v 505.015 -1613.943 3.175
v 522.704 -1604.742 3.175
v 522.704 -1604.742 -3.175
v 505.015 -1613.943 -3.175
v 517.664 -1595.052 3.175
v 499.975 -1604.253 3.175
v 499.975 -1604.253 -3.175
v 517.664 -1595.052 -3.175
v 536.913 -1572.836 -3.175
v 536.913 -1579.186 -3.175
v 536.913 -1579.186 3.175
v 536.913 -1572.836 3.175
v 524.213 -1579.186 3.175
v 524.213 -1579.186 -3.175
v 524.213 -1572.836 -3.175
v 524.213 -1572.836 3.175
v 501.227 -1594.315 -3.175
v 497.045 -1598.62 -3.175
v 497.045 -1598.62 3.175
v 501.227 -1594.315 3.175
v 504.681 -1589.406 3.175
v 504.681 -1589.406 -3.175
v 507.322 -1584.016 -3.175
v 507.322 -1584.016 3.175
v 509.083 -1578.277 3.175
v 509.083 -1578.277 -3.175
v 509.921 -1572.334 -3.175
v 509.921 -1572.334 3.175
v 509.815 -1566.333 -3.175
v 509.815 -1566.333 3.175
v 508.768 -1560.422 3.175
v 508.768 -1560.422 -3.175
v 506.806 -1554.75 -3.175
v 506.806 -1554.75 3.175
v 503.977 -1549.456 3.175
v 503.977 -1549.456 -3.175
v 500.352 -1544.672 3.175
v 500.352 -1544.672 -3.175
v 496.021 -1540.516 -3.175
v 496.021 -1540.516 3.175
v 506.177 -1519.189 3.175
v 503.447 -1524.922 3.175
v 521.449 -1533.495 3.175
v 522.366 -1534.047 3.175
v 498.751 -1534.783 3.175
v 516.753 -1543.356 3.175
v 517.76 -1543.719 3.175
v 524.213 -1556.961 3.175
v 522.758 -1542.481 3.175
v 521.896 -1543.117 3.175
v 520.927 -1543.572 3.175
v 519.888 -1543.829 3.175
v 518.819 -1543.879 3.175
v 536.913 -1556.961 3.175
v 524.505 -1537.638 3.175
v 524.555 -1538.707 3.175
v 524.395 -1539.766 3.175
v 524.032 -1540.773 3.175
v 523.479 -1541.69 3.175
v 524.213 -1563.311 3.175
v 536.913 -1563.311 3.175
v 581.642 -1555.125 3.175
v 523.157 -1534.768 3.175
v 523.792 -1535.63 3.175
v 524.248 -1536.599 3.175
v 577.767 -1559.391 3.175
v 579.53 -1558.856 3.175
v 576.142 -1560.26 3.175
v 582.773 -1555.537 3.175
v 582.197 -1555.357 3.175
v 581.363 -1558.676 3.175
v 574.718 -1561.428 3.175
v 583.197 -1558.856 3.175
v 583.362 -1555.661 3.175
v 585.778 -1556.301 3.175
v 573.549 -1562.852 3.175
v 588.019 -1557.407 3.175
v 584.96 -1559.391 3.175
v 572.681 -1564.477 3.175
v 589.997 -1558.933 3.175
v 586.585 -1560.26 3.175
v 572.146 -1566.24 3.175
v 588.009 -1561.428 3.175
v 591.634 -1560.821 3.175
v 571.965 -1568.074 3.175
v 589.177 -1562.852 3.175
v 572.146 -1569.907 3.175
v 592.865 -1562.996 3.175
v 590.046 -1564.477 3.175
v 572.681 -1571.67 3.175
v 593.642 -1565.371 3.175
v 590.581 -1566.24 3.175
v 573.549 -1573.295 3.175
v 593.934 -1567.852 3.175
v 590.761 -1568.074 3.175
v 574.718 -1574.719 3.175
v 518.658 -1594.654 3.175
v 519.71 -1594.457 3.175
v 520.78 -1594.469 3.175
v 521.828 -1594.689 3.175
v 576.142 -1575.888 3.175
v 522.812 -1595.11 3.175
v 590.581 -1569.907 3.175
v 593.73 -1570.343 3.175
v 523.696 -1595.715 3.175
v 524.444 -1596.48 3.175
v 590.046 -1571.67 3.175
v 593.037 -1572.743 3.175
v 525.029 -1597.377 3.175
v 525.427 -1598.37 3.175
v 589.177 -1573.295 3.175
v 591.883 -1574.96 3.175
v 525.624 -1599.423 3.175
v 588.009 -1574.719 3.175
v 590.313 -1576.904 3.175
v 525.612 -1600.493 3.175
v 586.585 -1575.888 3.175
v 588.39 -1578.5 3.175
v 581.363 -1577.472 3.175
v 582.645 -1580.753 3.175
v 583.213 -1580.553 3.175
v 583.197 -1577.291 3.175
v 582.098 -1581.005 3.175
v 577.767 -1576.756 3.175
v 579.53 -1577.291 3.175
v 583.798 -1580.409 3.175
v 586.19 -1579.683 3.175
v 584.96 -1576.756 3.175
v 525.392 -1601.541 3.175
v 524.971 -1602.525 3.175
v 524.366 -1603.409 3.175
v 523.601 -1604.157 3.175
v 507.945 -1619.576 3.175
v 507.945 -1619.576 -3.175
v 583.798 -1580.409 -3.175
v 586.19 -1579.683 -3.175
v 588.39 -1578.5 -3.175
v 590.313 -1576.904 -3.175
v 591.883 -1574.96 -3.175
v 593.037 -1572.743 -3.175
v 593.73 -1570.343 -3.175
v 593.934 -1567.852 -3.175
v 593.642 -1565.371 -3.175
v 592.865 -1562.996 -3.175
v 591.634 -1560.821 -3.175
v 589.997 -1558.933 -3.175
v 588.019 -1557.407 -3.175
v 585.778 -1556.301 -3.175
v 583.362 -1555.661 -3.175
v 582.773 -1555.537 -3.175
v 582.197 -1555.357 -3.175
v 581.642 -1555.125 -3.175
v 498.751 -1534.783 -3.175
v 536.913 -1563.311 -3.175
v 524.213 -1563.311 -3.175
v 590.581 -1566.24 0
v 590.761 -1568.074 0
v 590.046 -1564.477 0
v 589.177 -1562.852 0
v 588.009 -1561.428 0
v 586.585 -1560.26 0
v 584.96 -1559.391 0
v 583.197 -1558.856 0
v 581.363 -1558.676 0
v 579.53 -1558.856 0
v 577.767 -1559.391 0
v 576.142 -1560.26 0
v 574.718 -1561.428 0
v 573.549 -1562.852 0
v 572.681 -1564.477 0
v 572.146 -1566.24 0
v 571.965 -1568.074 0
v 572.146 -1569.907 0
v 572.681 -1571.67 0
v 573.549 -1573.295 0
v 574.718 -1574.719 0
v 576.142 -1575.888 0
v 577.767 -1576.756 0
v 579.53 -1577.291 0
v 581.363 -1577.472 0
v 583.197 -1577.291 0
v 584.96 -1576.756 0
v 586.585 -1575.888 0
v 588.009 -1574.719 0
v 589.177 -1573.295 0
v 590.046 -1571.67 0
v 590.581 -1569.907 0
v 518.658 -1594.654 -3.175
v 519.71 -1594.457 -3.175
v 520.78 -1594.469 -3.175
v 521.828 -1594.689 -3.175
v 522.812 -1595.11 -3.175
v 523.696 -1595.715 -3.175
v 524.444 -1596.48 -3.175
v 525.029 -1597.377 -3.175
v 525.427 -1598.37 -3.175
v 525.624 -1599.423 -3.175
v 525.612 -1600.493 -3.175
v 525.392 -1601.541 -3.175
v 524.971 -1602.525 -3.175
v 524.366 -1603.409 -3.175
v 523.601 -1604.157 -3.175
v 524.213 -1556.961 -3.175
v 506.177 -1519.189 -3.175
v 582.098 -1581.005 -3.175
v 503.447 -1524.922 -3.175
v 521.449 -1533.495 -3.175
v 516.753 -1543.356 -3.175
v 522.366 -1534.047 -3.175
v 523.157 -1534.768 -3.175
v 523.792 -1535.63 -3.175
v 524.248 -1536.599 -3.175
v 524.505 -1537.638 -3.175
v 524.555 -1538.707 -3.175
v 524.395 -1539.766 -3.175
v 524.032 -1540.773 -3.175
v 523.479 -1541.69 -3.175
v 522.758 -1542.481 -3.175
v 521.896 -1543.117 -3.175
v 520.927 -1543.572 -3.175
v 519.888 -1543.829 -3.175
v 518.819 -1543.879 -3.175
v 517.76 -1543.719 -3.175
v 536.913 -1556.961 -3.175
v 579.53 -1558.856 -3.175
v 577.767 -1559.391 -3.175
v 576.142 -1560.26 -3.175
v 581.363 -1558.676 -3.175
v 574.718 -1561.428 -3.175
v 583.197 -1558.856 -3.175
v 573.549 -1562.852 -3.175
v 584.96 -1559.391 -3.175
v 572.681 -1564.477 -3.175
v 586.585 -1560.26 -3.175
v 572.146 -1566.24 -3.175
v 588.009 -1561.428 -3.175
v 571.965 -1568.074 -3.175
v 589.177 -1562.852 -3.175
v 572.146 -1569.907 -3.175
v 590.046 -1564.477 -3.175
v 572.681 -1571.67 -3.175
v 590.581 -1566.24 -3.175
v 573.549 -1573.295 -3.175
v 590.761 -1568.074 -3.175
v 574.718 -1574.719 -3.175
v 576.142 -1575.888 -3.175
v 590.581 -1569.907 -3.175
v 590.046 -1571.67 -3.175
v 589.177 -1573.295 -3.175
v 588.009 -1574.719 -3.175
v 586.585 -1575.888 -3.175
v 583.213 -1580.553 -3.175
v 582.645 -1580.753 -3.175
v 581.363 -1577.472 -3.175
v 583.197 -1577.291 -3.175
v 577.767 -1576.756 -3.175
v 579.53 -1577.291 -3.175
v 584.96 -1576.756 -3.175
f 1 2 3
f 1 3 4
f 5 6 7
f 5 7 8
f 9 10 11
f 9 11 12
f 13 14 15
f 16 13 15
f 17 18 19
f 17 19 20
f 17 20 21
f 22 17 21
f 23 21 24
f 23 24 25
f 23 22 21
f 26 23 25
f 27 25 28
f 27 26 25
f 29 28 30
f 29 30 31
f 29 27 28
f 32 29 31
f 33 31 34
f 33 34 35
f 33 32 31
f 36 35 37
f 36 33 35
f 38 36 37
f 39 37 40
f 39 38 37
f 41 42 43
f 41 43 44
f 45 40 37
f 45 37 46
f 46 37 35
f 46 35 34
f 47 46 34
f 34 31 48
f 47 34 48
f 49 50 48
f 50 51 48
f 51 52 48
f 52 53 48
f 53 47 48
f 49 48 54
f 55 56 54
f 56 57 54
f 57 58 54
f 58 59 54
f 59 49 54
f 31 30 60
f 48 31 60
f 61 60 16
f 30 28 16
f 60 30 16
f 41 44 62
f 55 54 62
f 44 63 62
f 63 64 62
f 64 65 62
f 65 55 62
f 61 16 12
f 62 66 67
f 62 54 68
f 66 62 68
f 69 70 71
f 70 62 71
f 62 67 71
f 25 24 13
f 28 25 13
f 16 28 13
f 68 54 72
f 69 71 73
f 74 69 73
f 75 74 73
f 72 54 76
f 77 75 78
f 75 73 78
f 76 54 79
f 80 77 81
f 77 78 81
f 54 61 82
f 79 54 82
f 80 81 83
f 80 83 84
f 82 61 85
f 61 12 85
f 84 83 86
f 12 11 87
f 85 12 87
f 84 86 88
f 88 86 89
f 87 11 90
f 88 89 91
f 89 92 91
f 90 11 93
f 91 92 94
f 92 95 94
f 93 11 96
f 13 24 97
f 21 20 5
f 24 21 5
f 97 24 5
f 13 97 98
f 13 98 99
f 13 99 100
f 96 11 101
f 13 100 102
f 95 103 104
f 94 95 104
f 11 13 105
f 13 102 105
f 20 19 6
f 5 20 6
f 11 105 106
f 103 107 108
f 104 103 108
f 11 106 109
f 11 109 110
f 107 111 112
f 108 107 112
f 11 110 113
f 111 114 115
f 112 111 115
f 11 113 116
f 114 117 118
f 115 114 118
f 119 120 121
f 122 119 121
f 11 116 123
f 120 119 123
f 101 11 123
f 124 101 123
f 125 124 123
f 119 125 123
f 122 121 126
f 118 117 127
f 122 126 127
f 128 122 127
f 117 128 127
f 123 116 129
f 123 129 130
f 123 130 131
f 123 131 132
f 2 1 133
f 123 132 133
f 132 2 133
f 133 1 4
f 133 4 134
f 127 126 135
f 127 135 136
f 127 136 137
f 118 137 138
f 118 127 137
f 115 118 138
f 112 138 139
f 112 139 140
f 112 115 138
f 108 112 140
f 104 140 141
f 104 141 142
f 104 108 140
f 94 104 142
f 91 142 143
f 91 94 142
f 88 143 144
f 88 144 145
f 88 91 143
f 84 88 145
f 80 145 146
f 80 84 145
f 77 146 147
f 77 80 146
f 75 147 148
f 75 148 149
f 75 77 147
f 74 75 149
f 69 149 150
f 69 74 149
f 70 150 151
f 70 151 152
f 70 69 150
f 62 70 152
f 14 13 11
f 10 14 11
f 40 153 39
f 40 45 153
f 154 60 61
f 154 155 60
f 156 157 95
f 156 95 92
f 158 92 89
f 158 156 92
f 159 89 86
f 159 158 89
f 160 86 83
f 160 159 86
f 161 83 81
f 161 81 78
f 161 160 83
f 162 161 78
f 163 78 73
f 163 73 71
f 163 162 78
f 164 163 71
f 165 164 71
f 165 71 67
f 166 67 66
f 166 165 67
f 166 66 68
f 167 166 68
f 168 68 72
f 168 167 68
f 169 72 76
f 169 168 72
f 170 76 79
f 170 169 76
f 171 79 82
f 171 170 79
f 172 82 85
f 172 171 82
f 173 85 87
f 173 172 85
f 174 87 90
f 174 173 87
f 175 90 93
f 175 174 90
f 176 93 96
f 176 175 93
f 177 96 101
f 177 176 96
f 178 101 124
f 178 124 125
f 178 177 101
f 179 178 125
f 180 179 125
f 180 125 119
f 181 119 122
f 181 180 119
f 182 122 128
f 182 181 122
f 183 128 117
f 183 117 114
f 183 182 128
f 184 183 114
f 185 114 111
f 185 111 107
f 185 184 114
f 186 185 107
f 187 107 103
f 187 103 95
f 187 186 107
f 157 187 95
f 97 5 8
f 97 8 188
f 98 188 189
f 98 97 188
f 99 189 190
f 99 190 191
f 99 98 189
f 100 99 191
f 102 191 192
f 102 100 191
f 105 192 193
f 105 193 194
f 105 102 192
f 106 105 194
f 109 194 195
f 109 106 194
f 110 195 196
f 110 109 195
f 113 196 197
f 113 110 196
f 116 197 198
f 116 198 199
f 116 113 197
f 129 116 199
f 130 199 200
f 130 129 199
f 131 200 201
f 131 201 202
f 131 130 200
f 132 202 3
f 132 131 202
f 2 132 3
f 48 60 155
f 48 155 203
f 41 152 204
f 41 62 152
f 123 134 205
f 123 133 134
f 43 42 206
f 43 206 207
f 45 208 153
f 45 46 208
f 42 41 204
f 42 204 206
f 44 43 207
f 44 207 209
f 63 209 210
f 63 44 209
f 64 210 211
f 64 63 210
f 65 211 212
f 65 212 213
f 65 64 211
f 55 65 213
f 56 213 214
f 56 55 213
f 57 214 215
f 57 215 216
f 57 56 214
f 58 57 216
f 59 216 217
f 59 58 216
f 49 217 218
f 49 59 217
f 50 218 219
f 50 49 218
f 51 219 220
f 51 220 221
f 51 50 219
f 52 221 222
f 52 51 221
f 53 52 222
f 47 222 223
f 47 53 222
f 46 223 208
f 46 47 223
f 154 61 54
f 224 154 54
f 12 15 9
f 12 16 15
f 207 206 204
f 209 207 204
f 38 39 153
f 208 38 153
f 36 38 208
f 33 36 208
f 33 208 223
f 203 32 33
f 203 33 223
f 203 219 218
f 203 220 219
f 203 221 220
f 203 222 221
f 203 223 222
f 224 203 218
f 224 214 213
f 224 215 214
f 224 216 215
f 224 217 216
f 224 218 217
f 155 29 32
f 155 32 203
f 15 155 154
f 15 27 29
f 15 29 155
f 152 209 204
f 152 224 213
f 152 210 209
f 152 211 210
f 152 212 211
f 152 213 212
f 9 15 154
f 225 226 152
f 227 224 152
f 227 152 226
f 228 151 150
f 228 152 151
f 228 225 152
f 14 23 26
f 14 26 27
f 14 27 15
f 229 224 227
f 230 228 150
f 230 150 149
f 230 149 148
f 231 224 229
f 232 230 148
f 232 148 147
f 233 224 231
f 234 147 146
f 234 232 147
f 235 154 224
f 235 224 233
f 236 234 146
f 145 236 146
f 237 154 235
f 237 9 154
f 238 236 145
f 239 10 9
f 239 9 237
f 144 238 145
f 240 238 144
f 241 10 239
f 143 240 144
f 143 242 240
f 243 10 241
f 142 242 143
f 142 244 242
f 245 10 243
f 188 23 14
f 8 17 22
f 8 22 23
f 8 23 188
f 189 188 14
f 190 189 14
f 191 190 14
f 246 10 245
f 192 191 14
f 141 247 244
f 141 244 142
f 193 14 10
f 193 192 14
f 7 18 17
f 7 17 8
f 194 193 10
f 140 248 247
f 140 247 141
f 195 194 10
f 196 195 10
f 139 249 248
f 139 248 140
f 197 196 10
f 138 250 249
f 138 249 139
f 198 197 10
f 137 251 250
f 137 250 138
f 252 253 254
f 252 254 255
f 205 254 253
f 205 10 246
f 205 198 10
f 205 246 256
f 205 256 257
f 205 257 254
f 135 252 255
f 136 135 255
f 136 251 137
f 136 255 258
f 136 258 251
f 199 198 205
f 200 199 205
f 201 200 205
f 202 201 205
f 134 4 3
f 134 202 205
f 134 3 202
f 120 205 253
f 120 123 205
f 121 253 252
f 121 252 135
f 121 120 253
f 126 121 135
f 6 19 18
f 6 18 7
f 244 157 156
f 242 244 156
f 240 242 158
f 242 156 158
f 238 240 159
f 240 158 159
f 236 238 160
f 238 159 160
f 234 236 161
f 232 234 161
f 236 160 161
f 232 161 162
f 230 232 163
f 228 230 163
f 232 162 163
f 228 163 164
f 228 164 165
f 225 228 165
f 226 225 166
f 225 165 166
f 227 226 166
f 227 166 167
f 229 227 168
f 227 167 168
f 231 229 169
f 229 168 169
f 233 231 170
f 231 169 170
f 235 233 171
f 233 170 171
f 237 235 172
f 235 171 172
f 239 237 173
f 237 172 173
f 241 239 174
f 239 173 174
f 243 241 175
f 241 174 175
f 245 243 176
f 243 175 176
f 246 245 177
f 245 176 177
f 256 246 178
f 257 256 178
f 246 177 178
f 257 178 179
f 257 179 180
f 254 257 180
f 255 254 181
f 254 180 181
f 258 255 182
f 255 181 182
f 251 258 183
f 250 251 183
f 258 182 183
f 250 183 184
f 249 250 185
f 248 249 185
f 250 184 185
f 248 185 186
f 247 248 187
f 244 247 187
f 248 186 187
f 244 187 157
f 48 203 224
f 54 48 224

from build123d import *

# Parameters (mm, degrees)
SKETCH1_R           = 12.573
SKETCH1_R_2         = 9.398
BOSS_EXTRUDE1_DEPTH = 3.175
FILLET1_R           = 38.1
FILLET2_R           = 6.35
SKETCH2_W           = 12.7
SKETCH2_H           = 6.35
CUT_EXTRUDE1_DEPTH  = 3.175


with BuildPart() as part:
    # Sketch1 → Boss-Extrude1 (new, symmetric)
    # profile 1 of 4: a face of its own
    with BuildSketch(Plane.XY):
        with BuildLine():
            Line((503.446781124, -1524.922120572), (521.448925186, -1533.494549061))
            ThreePointArc((521.448925186, -1533.494549061), (524.031586139, -1540.772935173), (516.753200026, -1543.355596126))
            Line((516.753200026, -1543.355596126), (498.751055965, -1534.783167637))
            Line((498.751055965, -1534.783167637), (496.020983198, -1540.516334536))
            Line((496.020983198, -1540.516334536), (554.871597872, -1568.540367902))
            Line((554.871597872, -1568.540367902), (572.088750719, -1559.584617136))
            ThreePointArc((572.088750719, -1559.584617136), (576.84535815, -1556.340422204), (582.549387726, -1555.556737566))
            Line((582.549387726, -1555.556737566), (506.176853892, -1519.188953673))
            Line((506.176853892, -1519.188953673), (503.446781124, -1524.922120572))
        make_face()
    # profile 2 of 4: a face of its own
    with BuildSketch(Plane.XY):
        with BuildLine():
            ThreePointArc((572.393517032, -1576.884118428), (568.792205752, -1568.295127748), (572.088750719, -1559.584617136))
            Line((572.088750719, -1559.584617136), (554.871597872, -1568.540367902))
            Line((554.871597872, -1568.540367902), (572.393517032, -1576.884118428))
        make_face()
    # profile 3 of 4: a face of its own
    with BuildSketch(Plane.XY):
        with BuildLine():
            Line((572.393517032, -1576.884118428), (554.871597872, -1568.540367902))
            Line((554.871597872, -1568.540367902), (497.044597377, -1598.619917556))
            Line((497.044597377, -1598.619917556), (499.974916446, -1604.253365004))
            Line((499.974916446, -1604.253365004), (517.663941434, -1595.052163128))
            ThreePointArc((517.663941434, -1595.052163128), (525.028780639, -1597.376853534), (522.704090232, -1604.741692739))
            Line((522.704090232, -1604.741692739), (505.015065244, -1613.942894615))
            Line((505.015065244, -1613.942894615), (507.945384313, -1619.576342064))
            Line((507.945384313, -1619.576342064), (582.989537655, -1580.541041645))
            ThreePointArc((582.989537655, -1580.541041645), (577.261443726, -1579.958757387), (572.393517032, -1576.884118428))
        make_face()
    # profile 4 of 4: a face of its own
    with BuildSketch(Plane.XY):
        with Locations((581.363255123, -1568.073662845)):
            Circle(SKETCH1_R)
        with Locations((581.363255123, -1568.073662845)):
            Circle(SKETCH1_R_2, mode=Mode.SUBTRACT)
    extrude(amount=BOSS_EXTRUDE1_DEPTH, both=True)

    # Fillet1
    # the kernel refuses this fillet: 38.1 mm, written as the material it adds along each edge
    with BuildSketch(Plane(origin=(554.871597872, -1568.540367902, -3.175), x_dir=(-0.9028609288940066, 0.4299327192441295, 0), z_dir=(0, 0, 1))) as fillet1_piece_1:
        with BuildLine():
            CenterArc((74.290255, 36.995356759), FILLET1_R, 156.775740193, 99.393657747)
            Line((39.277556806, 52.01936971), (0, 0))
            Line((0, 0), (65.1823695, 0))
        make_face()
    extrude(amount=6.35)

    # Fillet2
    fillet2_edges = [part.edges().sort_by_distance(p)[0] for p in [
        (582.549387726, -1555.556737566, 0),
        (582.989537655, -1580.541041645, 0),
    ]]
    fillet(fillet2_edges, radius=FILLET2_R)

    # Sketch2 → Cut-Extrude1 (cut, symmetric)
    with BuildSketch(Plane.XY):
        with Locations((530.563255123, -1560.136162845)):
            Rectangle(SKETCH2_W, SKETCH2_H)
        with Locations((530.563255123, -1576.011162845)):
            Rectangle(SKETCH2_W, SKETCH2_H)
    extrude(amount=CUT_EXTRUDE1_DEPTH, both=True, mode=Mode.SUBTRACT)


solid = part.part
